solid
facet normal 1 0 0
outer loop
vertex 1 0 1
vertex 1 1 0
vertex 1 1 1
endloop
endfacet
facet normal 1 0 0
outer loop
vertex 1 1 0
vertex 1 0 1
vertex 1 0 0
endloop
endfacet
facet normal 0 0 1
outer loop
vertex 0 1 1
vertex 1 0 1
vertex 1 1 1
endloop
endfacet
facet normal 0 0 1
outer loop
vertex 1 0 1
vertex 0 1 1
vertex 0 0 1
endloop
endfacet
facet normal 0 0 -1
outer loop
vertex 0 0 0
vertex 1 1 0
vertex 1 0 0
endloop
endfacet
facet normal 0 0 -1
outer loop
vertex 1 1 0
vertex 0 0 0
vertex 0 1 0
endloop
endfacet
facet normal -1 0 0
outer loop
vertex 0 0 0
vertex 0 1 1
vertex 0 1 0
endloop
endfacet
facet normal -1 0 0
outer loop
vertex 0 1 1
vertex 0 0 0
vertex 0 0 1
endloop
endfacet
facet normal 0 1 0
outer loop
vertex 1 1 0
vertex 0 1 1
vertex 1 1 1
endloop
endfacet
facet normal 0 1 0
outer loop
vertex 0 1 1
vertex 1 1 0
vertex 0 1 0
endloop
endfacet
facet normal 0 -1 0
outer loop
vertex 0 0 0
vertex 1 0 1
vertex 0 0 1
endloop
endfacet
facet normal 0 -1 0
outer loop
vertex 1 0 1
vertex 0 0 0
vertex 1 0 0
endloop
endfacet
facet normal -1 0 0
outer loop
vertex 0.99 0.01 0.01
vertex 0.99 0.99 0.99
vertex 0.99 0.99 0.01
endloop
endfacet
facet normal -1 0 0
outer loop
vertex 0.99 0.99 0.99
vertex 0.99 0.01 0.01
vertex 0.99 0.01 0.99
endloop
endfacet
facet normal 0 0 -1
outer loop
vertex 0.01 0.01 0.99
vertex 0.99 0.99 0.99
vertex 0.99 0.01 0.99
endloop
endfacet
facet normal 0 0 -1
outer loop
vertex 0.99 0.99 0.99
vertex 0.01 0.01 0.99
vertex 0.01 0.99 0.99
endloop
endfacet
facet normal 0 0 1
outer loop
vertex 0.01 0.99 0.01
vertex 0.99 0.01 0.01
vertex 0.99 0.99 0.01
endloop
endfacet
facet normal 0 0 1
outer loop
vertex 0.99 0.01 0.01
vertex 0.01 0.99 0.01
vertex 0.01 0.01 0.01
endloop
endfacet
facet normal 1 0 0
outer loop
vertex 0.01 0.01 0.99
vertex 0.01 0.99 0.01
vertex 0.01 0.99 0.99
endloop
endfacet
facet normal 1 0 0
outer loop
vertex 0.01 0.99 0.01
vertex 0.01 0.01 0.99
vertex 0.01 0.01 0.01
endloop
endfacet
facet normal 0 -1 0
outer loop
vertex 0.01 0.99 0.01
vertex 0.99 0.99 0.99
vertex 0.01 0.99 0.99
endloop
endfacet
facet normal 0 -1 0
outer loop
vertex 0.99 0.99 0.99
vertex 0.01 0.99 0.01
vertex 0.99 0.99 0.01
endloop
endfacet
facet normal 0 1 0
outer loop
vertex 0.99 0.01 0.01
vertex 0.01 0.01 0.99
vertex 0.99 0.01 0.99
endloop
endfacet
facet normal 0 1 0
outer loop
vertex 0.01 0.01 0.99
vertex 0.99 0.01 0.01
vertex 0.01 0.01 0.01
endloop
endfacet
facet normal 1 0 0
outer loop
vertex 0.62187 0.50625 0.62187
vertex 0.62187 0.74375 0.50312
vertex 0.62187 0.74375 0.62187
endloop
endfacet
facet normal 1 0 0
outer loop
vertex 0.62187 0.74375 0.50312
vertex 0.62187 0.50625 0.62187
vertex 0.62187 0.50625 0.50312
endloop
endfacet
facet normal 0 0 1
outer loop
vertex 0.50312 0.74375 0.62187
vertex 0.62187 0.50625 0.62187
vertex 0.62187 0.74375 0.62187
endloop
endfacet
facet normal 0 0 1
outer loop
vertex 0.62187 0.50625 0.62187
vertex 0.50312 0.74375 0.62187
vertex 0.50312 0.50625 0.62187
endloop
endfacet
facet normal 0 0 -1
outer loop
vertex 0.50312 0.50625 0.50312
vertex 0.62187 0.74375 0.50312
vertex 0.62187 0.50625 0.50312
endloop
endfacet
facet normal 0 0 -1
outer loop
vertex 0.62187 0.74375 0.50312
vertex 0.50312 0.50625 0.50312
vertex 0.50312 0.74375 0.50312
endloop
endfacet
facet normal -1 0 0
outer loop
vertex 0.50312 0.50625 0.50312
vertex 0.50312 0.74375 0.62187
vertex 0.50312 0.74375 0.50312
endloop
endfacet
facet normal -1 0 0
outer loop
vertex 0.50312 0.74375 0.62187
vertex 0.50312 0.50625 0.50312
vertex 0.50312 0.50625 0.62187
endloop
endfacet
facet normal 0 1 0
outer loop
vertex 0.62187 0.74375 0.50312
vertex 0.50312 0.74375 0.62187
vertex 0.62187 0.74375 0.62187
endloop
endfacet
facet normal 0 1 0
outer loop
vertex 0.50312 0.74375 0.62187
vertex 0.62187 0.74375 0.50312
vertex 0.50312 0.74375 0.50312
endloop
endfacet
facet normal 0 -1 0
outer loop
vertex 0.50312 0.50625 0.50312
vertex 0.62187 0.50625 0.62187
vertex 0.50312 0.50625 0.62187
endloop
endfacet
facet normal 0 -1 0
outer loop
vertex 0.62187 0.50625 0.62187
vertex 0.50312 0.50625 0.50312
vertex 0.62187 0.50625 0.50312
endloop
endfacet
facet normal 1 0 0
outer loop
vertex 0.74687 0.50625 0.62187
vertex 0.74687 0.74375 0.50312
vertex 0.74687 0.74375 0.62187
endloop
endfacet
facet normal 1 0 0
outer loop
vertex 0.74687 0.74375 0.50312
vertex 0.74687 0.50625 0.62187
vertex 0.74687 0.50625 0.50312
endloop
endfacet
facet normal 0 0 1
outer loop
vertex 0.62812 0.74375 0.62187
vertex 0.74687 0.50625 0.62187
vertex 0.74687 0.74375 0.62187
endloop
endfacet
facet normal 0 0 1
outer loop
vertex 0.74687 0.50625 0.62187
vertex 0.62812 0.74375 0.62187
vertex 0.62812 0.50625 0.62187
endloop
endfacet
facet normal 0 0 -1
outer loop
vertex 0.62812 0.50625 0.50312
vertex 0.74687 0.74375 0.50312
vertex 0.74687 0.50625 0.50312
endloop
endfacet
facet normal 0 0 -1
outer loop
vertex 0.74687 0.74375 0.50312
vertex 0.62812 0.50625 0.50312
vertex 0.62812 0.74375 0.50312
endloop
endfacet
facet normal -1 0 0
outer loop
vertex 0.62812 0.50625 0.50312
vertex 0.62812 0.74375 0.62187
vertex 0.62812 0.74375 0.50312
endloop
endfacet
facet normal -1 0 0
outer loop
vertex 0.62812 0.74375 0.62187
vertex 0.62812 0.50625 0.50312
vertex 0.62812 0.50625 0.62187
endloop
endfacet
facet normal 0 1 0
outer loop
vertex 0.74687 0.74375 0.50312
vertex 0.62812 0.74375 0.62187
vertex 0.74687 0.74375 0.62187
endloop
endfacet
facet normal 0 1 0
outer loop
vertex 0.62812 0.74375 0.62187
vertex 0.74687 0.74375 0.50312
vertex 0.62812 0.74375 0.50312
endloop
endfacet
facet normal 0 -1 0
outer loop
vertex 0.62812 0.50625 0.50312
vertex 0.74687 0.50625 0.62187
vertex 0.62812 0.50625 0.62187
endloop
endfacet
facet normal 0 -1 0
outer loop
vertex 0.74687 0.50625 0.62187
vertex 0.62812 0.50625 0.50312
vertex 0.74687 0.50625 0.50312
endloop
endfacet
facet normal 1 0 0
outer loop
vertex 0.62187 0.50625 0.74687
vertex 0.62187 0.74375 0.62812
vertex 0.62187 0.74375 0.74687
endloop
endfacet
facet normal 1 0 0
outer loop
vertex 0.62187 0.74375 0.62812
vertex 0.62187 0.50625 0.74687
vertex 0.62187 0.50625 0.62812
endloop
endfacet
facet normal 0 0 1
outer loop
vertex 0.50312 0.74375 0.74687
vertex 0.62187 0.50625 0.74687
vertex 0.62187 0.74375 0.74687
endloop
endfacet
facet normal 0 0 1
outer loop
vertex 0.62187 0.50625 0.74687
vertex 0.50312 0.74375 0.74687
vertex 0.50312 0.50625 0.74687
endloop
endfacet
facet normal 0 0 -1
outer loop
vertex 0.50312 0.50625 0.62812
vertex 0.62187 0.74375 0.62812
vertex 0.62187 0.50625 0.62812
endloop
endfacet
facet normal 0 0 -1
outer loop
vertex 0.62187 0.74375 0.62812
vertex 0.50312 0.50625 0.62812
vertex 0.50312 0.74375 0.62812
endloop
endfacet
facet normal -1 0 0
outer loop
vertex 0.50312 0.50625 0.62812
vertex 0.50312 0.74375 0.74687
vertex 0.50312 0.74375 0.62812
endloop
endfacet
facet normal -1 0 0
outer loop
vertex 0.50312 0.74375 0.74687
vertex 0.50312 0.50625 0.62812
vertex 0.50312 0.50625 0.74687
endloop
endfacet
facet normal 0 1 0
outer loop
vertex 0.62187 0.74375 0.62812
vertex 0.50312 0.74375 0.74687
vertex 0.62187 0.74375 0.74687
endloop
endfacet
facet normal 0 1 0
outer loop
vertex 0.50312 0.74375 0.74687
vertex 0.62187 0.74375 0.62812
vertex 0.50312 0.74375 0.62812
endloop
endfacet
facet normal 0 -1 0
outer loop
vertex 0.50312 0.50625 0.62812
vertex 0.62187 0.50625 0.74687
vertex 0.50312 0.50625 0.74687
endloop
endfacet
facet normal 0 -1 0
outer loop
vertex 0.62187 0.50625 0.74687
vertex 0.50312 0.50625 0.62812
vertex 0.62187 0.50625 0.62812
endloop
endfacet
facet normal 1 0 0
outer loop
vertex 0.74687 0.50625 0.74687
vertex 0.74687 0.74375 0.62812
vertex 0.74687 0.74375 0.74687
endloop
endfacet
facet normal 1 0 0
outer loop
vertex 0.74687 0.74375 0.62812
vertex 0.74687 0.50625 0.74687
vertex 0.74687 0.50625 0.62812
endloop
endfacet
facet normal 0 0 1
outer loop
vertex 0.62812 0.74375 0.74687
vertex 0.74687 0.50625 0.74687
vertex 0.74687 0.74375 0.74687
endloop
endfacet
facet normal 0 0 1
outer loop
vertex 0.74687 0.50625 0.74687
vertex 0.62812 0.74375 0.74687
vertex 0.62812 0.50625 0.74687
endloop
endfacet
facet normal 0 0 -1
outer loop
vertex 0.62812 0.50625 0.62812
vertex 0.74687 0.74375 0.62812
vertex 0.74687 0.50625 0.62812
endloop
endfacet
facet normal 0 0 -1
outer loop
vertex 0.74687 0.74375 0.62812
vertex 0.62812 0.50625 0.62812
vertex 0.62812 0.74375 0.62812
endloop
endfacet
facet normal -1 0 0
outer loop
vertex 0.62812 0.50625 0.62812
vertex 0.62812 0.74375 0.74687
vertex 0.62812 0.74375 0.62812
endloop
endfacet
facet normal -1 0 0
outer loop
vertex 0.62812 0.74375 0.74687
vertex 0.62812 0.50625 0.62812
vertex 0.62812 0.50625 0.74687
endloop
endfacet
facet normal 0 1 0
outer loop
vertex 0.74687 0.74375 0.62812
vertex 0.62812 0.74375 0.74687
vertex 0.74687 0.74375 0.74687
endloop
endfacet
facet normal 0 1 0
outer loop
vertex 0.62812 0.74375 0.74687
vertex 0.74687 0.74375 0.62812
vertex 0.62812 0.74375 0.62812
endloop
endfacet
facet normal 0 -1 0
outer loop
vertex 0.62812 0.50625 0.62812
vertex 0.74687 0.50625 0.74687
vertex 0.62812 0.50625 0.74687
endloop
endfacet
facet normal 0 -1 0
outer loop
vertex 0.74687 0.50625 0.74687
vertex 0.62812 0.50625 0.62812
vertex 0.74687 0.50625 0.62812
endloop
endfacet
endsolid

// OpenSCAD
translate([0.5625, 0.625, 0.5625]) color([0.983983673787379, 0.945272707501306, 0.015069089408580982]) cube([0.11875, 0.2375, 0.11875], center=true);
translate([0.6875, 0.625, 0.5625]) color([0.43433393798664355, 0.09606526099883694, 0.16955027675806467]) cube([0.11875, 0.2375, 0.11875], center=true);
translate([0.5625, 0.625, 0.6875]) color([0.5289484293709992, 0.11167799320565552, 0.303291471236262]) cube([0.11875, 0.2375, 0.11875], center=true);
translate([0.6875, 0.625, 0.6875]) color([0.16288448510382103, 0.593745530078827, 0.07317101416789551]) cube([0.11875, 0.2375, 0.11875], center=true);
color([0.3,0.3,0.3,0.3]) difference() { cube([1,1,1]); translate([0.01,0.01,0.01]) cube([0.98,0.98,0.98]); }
